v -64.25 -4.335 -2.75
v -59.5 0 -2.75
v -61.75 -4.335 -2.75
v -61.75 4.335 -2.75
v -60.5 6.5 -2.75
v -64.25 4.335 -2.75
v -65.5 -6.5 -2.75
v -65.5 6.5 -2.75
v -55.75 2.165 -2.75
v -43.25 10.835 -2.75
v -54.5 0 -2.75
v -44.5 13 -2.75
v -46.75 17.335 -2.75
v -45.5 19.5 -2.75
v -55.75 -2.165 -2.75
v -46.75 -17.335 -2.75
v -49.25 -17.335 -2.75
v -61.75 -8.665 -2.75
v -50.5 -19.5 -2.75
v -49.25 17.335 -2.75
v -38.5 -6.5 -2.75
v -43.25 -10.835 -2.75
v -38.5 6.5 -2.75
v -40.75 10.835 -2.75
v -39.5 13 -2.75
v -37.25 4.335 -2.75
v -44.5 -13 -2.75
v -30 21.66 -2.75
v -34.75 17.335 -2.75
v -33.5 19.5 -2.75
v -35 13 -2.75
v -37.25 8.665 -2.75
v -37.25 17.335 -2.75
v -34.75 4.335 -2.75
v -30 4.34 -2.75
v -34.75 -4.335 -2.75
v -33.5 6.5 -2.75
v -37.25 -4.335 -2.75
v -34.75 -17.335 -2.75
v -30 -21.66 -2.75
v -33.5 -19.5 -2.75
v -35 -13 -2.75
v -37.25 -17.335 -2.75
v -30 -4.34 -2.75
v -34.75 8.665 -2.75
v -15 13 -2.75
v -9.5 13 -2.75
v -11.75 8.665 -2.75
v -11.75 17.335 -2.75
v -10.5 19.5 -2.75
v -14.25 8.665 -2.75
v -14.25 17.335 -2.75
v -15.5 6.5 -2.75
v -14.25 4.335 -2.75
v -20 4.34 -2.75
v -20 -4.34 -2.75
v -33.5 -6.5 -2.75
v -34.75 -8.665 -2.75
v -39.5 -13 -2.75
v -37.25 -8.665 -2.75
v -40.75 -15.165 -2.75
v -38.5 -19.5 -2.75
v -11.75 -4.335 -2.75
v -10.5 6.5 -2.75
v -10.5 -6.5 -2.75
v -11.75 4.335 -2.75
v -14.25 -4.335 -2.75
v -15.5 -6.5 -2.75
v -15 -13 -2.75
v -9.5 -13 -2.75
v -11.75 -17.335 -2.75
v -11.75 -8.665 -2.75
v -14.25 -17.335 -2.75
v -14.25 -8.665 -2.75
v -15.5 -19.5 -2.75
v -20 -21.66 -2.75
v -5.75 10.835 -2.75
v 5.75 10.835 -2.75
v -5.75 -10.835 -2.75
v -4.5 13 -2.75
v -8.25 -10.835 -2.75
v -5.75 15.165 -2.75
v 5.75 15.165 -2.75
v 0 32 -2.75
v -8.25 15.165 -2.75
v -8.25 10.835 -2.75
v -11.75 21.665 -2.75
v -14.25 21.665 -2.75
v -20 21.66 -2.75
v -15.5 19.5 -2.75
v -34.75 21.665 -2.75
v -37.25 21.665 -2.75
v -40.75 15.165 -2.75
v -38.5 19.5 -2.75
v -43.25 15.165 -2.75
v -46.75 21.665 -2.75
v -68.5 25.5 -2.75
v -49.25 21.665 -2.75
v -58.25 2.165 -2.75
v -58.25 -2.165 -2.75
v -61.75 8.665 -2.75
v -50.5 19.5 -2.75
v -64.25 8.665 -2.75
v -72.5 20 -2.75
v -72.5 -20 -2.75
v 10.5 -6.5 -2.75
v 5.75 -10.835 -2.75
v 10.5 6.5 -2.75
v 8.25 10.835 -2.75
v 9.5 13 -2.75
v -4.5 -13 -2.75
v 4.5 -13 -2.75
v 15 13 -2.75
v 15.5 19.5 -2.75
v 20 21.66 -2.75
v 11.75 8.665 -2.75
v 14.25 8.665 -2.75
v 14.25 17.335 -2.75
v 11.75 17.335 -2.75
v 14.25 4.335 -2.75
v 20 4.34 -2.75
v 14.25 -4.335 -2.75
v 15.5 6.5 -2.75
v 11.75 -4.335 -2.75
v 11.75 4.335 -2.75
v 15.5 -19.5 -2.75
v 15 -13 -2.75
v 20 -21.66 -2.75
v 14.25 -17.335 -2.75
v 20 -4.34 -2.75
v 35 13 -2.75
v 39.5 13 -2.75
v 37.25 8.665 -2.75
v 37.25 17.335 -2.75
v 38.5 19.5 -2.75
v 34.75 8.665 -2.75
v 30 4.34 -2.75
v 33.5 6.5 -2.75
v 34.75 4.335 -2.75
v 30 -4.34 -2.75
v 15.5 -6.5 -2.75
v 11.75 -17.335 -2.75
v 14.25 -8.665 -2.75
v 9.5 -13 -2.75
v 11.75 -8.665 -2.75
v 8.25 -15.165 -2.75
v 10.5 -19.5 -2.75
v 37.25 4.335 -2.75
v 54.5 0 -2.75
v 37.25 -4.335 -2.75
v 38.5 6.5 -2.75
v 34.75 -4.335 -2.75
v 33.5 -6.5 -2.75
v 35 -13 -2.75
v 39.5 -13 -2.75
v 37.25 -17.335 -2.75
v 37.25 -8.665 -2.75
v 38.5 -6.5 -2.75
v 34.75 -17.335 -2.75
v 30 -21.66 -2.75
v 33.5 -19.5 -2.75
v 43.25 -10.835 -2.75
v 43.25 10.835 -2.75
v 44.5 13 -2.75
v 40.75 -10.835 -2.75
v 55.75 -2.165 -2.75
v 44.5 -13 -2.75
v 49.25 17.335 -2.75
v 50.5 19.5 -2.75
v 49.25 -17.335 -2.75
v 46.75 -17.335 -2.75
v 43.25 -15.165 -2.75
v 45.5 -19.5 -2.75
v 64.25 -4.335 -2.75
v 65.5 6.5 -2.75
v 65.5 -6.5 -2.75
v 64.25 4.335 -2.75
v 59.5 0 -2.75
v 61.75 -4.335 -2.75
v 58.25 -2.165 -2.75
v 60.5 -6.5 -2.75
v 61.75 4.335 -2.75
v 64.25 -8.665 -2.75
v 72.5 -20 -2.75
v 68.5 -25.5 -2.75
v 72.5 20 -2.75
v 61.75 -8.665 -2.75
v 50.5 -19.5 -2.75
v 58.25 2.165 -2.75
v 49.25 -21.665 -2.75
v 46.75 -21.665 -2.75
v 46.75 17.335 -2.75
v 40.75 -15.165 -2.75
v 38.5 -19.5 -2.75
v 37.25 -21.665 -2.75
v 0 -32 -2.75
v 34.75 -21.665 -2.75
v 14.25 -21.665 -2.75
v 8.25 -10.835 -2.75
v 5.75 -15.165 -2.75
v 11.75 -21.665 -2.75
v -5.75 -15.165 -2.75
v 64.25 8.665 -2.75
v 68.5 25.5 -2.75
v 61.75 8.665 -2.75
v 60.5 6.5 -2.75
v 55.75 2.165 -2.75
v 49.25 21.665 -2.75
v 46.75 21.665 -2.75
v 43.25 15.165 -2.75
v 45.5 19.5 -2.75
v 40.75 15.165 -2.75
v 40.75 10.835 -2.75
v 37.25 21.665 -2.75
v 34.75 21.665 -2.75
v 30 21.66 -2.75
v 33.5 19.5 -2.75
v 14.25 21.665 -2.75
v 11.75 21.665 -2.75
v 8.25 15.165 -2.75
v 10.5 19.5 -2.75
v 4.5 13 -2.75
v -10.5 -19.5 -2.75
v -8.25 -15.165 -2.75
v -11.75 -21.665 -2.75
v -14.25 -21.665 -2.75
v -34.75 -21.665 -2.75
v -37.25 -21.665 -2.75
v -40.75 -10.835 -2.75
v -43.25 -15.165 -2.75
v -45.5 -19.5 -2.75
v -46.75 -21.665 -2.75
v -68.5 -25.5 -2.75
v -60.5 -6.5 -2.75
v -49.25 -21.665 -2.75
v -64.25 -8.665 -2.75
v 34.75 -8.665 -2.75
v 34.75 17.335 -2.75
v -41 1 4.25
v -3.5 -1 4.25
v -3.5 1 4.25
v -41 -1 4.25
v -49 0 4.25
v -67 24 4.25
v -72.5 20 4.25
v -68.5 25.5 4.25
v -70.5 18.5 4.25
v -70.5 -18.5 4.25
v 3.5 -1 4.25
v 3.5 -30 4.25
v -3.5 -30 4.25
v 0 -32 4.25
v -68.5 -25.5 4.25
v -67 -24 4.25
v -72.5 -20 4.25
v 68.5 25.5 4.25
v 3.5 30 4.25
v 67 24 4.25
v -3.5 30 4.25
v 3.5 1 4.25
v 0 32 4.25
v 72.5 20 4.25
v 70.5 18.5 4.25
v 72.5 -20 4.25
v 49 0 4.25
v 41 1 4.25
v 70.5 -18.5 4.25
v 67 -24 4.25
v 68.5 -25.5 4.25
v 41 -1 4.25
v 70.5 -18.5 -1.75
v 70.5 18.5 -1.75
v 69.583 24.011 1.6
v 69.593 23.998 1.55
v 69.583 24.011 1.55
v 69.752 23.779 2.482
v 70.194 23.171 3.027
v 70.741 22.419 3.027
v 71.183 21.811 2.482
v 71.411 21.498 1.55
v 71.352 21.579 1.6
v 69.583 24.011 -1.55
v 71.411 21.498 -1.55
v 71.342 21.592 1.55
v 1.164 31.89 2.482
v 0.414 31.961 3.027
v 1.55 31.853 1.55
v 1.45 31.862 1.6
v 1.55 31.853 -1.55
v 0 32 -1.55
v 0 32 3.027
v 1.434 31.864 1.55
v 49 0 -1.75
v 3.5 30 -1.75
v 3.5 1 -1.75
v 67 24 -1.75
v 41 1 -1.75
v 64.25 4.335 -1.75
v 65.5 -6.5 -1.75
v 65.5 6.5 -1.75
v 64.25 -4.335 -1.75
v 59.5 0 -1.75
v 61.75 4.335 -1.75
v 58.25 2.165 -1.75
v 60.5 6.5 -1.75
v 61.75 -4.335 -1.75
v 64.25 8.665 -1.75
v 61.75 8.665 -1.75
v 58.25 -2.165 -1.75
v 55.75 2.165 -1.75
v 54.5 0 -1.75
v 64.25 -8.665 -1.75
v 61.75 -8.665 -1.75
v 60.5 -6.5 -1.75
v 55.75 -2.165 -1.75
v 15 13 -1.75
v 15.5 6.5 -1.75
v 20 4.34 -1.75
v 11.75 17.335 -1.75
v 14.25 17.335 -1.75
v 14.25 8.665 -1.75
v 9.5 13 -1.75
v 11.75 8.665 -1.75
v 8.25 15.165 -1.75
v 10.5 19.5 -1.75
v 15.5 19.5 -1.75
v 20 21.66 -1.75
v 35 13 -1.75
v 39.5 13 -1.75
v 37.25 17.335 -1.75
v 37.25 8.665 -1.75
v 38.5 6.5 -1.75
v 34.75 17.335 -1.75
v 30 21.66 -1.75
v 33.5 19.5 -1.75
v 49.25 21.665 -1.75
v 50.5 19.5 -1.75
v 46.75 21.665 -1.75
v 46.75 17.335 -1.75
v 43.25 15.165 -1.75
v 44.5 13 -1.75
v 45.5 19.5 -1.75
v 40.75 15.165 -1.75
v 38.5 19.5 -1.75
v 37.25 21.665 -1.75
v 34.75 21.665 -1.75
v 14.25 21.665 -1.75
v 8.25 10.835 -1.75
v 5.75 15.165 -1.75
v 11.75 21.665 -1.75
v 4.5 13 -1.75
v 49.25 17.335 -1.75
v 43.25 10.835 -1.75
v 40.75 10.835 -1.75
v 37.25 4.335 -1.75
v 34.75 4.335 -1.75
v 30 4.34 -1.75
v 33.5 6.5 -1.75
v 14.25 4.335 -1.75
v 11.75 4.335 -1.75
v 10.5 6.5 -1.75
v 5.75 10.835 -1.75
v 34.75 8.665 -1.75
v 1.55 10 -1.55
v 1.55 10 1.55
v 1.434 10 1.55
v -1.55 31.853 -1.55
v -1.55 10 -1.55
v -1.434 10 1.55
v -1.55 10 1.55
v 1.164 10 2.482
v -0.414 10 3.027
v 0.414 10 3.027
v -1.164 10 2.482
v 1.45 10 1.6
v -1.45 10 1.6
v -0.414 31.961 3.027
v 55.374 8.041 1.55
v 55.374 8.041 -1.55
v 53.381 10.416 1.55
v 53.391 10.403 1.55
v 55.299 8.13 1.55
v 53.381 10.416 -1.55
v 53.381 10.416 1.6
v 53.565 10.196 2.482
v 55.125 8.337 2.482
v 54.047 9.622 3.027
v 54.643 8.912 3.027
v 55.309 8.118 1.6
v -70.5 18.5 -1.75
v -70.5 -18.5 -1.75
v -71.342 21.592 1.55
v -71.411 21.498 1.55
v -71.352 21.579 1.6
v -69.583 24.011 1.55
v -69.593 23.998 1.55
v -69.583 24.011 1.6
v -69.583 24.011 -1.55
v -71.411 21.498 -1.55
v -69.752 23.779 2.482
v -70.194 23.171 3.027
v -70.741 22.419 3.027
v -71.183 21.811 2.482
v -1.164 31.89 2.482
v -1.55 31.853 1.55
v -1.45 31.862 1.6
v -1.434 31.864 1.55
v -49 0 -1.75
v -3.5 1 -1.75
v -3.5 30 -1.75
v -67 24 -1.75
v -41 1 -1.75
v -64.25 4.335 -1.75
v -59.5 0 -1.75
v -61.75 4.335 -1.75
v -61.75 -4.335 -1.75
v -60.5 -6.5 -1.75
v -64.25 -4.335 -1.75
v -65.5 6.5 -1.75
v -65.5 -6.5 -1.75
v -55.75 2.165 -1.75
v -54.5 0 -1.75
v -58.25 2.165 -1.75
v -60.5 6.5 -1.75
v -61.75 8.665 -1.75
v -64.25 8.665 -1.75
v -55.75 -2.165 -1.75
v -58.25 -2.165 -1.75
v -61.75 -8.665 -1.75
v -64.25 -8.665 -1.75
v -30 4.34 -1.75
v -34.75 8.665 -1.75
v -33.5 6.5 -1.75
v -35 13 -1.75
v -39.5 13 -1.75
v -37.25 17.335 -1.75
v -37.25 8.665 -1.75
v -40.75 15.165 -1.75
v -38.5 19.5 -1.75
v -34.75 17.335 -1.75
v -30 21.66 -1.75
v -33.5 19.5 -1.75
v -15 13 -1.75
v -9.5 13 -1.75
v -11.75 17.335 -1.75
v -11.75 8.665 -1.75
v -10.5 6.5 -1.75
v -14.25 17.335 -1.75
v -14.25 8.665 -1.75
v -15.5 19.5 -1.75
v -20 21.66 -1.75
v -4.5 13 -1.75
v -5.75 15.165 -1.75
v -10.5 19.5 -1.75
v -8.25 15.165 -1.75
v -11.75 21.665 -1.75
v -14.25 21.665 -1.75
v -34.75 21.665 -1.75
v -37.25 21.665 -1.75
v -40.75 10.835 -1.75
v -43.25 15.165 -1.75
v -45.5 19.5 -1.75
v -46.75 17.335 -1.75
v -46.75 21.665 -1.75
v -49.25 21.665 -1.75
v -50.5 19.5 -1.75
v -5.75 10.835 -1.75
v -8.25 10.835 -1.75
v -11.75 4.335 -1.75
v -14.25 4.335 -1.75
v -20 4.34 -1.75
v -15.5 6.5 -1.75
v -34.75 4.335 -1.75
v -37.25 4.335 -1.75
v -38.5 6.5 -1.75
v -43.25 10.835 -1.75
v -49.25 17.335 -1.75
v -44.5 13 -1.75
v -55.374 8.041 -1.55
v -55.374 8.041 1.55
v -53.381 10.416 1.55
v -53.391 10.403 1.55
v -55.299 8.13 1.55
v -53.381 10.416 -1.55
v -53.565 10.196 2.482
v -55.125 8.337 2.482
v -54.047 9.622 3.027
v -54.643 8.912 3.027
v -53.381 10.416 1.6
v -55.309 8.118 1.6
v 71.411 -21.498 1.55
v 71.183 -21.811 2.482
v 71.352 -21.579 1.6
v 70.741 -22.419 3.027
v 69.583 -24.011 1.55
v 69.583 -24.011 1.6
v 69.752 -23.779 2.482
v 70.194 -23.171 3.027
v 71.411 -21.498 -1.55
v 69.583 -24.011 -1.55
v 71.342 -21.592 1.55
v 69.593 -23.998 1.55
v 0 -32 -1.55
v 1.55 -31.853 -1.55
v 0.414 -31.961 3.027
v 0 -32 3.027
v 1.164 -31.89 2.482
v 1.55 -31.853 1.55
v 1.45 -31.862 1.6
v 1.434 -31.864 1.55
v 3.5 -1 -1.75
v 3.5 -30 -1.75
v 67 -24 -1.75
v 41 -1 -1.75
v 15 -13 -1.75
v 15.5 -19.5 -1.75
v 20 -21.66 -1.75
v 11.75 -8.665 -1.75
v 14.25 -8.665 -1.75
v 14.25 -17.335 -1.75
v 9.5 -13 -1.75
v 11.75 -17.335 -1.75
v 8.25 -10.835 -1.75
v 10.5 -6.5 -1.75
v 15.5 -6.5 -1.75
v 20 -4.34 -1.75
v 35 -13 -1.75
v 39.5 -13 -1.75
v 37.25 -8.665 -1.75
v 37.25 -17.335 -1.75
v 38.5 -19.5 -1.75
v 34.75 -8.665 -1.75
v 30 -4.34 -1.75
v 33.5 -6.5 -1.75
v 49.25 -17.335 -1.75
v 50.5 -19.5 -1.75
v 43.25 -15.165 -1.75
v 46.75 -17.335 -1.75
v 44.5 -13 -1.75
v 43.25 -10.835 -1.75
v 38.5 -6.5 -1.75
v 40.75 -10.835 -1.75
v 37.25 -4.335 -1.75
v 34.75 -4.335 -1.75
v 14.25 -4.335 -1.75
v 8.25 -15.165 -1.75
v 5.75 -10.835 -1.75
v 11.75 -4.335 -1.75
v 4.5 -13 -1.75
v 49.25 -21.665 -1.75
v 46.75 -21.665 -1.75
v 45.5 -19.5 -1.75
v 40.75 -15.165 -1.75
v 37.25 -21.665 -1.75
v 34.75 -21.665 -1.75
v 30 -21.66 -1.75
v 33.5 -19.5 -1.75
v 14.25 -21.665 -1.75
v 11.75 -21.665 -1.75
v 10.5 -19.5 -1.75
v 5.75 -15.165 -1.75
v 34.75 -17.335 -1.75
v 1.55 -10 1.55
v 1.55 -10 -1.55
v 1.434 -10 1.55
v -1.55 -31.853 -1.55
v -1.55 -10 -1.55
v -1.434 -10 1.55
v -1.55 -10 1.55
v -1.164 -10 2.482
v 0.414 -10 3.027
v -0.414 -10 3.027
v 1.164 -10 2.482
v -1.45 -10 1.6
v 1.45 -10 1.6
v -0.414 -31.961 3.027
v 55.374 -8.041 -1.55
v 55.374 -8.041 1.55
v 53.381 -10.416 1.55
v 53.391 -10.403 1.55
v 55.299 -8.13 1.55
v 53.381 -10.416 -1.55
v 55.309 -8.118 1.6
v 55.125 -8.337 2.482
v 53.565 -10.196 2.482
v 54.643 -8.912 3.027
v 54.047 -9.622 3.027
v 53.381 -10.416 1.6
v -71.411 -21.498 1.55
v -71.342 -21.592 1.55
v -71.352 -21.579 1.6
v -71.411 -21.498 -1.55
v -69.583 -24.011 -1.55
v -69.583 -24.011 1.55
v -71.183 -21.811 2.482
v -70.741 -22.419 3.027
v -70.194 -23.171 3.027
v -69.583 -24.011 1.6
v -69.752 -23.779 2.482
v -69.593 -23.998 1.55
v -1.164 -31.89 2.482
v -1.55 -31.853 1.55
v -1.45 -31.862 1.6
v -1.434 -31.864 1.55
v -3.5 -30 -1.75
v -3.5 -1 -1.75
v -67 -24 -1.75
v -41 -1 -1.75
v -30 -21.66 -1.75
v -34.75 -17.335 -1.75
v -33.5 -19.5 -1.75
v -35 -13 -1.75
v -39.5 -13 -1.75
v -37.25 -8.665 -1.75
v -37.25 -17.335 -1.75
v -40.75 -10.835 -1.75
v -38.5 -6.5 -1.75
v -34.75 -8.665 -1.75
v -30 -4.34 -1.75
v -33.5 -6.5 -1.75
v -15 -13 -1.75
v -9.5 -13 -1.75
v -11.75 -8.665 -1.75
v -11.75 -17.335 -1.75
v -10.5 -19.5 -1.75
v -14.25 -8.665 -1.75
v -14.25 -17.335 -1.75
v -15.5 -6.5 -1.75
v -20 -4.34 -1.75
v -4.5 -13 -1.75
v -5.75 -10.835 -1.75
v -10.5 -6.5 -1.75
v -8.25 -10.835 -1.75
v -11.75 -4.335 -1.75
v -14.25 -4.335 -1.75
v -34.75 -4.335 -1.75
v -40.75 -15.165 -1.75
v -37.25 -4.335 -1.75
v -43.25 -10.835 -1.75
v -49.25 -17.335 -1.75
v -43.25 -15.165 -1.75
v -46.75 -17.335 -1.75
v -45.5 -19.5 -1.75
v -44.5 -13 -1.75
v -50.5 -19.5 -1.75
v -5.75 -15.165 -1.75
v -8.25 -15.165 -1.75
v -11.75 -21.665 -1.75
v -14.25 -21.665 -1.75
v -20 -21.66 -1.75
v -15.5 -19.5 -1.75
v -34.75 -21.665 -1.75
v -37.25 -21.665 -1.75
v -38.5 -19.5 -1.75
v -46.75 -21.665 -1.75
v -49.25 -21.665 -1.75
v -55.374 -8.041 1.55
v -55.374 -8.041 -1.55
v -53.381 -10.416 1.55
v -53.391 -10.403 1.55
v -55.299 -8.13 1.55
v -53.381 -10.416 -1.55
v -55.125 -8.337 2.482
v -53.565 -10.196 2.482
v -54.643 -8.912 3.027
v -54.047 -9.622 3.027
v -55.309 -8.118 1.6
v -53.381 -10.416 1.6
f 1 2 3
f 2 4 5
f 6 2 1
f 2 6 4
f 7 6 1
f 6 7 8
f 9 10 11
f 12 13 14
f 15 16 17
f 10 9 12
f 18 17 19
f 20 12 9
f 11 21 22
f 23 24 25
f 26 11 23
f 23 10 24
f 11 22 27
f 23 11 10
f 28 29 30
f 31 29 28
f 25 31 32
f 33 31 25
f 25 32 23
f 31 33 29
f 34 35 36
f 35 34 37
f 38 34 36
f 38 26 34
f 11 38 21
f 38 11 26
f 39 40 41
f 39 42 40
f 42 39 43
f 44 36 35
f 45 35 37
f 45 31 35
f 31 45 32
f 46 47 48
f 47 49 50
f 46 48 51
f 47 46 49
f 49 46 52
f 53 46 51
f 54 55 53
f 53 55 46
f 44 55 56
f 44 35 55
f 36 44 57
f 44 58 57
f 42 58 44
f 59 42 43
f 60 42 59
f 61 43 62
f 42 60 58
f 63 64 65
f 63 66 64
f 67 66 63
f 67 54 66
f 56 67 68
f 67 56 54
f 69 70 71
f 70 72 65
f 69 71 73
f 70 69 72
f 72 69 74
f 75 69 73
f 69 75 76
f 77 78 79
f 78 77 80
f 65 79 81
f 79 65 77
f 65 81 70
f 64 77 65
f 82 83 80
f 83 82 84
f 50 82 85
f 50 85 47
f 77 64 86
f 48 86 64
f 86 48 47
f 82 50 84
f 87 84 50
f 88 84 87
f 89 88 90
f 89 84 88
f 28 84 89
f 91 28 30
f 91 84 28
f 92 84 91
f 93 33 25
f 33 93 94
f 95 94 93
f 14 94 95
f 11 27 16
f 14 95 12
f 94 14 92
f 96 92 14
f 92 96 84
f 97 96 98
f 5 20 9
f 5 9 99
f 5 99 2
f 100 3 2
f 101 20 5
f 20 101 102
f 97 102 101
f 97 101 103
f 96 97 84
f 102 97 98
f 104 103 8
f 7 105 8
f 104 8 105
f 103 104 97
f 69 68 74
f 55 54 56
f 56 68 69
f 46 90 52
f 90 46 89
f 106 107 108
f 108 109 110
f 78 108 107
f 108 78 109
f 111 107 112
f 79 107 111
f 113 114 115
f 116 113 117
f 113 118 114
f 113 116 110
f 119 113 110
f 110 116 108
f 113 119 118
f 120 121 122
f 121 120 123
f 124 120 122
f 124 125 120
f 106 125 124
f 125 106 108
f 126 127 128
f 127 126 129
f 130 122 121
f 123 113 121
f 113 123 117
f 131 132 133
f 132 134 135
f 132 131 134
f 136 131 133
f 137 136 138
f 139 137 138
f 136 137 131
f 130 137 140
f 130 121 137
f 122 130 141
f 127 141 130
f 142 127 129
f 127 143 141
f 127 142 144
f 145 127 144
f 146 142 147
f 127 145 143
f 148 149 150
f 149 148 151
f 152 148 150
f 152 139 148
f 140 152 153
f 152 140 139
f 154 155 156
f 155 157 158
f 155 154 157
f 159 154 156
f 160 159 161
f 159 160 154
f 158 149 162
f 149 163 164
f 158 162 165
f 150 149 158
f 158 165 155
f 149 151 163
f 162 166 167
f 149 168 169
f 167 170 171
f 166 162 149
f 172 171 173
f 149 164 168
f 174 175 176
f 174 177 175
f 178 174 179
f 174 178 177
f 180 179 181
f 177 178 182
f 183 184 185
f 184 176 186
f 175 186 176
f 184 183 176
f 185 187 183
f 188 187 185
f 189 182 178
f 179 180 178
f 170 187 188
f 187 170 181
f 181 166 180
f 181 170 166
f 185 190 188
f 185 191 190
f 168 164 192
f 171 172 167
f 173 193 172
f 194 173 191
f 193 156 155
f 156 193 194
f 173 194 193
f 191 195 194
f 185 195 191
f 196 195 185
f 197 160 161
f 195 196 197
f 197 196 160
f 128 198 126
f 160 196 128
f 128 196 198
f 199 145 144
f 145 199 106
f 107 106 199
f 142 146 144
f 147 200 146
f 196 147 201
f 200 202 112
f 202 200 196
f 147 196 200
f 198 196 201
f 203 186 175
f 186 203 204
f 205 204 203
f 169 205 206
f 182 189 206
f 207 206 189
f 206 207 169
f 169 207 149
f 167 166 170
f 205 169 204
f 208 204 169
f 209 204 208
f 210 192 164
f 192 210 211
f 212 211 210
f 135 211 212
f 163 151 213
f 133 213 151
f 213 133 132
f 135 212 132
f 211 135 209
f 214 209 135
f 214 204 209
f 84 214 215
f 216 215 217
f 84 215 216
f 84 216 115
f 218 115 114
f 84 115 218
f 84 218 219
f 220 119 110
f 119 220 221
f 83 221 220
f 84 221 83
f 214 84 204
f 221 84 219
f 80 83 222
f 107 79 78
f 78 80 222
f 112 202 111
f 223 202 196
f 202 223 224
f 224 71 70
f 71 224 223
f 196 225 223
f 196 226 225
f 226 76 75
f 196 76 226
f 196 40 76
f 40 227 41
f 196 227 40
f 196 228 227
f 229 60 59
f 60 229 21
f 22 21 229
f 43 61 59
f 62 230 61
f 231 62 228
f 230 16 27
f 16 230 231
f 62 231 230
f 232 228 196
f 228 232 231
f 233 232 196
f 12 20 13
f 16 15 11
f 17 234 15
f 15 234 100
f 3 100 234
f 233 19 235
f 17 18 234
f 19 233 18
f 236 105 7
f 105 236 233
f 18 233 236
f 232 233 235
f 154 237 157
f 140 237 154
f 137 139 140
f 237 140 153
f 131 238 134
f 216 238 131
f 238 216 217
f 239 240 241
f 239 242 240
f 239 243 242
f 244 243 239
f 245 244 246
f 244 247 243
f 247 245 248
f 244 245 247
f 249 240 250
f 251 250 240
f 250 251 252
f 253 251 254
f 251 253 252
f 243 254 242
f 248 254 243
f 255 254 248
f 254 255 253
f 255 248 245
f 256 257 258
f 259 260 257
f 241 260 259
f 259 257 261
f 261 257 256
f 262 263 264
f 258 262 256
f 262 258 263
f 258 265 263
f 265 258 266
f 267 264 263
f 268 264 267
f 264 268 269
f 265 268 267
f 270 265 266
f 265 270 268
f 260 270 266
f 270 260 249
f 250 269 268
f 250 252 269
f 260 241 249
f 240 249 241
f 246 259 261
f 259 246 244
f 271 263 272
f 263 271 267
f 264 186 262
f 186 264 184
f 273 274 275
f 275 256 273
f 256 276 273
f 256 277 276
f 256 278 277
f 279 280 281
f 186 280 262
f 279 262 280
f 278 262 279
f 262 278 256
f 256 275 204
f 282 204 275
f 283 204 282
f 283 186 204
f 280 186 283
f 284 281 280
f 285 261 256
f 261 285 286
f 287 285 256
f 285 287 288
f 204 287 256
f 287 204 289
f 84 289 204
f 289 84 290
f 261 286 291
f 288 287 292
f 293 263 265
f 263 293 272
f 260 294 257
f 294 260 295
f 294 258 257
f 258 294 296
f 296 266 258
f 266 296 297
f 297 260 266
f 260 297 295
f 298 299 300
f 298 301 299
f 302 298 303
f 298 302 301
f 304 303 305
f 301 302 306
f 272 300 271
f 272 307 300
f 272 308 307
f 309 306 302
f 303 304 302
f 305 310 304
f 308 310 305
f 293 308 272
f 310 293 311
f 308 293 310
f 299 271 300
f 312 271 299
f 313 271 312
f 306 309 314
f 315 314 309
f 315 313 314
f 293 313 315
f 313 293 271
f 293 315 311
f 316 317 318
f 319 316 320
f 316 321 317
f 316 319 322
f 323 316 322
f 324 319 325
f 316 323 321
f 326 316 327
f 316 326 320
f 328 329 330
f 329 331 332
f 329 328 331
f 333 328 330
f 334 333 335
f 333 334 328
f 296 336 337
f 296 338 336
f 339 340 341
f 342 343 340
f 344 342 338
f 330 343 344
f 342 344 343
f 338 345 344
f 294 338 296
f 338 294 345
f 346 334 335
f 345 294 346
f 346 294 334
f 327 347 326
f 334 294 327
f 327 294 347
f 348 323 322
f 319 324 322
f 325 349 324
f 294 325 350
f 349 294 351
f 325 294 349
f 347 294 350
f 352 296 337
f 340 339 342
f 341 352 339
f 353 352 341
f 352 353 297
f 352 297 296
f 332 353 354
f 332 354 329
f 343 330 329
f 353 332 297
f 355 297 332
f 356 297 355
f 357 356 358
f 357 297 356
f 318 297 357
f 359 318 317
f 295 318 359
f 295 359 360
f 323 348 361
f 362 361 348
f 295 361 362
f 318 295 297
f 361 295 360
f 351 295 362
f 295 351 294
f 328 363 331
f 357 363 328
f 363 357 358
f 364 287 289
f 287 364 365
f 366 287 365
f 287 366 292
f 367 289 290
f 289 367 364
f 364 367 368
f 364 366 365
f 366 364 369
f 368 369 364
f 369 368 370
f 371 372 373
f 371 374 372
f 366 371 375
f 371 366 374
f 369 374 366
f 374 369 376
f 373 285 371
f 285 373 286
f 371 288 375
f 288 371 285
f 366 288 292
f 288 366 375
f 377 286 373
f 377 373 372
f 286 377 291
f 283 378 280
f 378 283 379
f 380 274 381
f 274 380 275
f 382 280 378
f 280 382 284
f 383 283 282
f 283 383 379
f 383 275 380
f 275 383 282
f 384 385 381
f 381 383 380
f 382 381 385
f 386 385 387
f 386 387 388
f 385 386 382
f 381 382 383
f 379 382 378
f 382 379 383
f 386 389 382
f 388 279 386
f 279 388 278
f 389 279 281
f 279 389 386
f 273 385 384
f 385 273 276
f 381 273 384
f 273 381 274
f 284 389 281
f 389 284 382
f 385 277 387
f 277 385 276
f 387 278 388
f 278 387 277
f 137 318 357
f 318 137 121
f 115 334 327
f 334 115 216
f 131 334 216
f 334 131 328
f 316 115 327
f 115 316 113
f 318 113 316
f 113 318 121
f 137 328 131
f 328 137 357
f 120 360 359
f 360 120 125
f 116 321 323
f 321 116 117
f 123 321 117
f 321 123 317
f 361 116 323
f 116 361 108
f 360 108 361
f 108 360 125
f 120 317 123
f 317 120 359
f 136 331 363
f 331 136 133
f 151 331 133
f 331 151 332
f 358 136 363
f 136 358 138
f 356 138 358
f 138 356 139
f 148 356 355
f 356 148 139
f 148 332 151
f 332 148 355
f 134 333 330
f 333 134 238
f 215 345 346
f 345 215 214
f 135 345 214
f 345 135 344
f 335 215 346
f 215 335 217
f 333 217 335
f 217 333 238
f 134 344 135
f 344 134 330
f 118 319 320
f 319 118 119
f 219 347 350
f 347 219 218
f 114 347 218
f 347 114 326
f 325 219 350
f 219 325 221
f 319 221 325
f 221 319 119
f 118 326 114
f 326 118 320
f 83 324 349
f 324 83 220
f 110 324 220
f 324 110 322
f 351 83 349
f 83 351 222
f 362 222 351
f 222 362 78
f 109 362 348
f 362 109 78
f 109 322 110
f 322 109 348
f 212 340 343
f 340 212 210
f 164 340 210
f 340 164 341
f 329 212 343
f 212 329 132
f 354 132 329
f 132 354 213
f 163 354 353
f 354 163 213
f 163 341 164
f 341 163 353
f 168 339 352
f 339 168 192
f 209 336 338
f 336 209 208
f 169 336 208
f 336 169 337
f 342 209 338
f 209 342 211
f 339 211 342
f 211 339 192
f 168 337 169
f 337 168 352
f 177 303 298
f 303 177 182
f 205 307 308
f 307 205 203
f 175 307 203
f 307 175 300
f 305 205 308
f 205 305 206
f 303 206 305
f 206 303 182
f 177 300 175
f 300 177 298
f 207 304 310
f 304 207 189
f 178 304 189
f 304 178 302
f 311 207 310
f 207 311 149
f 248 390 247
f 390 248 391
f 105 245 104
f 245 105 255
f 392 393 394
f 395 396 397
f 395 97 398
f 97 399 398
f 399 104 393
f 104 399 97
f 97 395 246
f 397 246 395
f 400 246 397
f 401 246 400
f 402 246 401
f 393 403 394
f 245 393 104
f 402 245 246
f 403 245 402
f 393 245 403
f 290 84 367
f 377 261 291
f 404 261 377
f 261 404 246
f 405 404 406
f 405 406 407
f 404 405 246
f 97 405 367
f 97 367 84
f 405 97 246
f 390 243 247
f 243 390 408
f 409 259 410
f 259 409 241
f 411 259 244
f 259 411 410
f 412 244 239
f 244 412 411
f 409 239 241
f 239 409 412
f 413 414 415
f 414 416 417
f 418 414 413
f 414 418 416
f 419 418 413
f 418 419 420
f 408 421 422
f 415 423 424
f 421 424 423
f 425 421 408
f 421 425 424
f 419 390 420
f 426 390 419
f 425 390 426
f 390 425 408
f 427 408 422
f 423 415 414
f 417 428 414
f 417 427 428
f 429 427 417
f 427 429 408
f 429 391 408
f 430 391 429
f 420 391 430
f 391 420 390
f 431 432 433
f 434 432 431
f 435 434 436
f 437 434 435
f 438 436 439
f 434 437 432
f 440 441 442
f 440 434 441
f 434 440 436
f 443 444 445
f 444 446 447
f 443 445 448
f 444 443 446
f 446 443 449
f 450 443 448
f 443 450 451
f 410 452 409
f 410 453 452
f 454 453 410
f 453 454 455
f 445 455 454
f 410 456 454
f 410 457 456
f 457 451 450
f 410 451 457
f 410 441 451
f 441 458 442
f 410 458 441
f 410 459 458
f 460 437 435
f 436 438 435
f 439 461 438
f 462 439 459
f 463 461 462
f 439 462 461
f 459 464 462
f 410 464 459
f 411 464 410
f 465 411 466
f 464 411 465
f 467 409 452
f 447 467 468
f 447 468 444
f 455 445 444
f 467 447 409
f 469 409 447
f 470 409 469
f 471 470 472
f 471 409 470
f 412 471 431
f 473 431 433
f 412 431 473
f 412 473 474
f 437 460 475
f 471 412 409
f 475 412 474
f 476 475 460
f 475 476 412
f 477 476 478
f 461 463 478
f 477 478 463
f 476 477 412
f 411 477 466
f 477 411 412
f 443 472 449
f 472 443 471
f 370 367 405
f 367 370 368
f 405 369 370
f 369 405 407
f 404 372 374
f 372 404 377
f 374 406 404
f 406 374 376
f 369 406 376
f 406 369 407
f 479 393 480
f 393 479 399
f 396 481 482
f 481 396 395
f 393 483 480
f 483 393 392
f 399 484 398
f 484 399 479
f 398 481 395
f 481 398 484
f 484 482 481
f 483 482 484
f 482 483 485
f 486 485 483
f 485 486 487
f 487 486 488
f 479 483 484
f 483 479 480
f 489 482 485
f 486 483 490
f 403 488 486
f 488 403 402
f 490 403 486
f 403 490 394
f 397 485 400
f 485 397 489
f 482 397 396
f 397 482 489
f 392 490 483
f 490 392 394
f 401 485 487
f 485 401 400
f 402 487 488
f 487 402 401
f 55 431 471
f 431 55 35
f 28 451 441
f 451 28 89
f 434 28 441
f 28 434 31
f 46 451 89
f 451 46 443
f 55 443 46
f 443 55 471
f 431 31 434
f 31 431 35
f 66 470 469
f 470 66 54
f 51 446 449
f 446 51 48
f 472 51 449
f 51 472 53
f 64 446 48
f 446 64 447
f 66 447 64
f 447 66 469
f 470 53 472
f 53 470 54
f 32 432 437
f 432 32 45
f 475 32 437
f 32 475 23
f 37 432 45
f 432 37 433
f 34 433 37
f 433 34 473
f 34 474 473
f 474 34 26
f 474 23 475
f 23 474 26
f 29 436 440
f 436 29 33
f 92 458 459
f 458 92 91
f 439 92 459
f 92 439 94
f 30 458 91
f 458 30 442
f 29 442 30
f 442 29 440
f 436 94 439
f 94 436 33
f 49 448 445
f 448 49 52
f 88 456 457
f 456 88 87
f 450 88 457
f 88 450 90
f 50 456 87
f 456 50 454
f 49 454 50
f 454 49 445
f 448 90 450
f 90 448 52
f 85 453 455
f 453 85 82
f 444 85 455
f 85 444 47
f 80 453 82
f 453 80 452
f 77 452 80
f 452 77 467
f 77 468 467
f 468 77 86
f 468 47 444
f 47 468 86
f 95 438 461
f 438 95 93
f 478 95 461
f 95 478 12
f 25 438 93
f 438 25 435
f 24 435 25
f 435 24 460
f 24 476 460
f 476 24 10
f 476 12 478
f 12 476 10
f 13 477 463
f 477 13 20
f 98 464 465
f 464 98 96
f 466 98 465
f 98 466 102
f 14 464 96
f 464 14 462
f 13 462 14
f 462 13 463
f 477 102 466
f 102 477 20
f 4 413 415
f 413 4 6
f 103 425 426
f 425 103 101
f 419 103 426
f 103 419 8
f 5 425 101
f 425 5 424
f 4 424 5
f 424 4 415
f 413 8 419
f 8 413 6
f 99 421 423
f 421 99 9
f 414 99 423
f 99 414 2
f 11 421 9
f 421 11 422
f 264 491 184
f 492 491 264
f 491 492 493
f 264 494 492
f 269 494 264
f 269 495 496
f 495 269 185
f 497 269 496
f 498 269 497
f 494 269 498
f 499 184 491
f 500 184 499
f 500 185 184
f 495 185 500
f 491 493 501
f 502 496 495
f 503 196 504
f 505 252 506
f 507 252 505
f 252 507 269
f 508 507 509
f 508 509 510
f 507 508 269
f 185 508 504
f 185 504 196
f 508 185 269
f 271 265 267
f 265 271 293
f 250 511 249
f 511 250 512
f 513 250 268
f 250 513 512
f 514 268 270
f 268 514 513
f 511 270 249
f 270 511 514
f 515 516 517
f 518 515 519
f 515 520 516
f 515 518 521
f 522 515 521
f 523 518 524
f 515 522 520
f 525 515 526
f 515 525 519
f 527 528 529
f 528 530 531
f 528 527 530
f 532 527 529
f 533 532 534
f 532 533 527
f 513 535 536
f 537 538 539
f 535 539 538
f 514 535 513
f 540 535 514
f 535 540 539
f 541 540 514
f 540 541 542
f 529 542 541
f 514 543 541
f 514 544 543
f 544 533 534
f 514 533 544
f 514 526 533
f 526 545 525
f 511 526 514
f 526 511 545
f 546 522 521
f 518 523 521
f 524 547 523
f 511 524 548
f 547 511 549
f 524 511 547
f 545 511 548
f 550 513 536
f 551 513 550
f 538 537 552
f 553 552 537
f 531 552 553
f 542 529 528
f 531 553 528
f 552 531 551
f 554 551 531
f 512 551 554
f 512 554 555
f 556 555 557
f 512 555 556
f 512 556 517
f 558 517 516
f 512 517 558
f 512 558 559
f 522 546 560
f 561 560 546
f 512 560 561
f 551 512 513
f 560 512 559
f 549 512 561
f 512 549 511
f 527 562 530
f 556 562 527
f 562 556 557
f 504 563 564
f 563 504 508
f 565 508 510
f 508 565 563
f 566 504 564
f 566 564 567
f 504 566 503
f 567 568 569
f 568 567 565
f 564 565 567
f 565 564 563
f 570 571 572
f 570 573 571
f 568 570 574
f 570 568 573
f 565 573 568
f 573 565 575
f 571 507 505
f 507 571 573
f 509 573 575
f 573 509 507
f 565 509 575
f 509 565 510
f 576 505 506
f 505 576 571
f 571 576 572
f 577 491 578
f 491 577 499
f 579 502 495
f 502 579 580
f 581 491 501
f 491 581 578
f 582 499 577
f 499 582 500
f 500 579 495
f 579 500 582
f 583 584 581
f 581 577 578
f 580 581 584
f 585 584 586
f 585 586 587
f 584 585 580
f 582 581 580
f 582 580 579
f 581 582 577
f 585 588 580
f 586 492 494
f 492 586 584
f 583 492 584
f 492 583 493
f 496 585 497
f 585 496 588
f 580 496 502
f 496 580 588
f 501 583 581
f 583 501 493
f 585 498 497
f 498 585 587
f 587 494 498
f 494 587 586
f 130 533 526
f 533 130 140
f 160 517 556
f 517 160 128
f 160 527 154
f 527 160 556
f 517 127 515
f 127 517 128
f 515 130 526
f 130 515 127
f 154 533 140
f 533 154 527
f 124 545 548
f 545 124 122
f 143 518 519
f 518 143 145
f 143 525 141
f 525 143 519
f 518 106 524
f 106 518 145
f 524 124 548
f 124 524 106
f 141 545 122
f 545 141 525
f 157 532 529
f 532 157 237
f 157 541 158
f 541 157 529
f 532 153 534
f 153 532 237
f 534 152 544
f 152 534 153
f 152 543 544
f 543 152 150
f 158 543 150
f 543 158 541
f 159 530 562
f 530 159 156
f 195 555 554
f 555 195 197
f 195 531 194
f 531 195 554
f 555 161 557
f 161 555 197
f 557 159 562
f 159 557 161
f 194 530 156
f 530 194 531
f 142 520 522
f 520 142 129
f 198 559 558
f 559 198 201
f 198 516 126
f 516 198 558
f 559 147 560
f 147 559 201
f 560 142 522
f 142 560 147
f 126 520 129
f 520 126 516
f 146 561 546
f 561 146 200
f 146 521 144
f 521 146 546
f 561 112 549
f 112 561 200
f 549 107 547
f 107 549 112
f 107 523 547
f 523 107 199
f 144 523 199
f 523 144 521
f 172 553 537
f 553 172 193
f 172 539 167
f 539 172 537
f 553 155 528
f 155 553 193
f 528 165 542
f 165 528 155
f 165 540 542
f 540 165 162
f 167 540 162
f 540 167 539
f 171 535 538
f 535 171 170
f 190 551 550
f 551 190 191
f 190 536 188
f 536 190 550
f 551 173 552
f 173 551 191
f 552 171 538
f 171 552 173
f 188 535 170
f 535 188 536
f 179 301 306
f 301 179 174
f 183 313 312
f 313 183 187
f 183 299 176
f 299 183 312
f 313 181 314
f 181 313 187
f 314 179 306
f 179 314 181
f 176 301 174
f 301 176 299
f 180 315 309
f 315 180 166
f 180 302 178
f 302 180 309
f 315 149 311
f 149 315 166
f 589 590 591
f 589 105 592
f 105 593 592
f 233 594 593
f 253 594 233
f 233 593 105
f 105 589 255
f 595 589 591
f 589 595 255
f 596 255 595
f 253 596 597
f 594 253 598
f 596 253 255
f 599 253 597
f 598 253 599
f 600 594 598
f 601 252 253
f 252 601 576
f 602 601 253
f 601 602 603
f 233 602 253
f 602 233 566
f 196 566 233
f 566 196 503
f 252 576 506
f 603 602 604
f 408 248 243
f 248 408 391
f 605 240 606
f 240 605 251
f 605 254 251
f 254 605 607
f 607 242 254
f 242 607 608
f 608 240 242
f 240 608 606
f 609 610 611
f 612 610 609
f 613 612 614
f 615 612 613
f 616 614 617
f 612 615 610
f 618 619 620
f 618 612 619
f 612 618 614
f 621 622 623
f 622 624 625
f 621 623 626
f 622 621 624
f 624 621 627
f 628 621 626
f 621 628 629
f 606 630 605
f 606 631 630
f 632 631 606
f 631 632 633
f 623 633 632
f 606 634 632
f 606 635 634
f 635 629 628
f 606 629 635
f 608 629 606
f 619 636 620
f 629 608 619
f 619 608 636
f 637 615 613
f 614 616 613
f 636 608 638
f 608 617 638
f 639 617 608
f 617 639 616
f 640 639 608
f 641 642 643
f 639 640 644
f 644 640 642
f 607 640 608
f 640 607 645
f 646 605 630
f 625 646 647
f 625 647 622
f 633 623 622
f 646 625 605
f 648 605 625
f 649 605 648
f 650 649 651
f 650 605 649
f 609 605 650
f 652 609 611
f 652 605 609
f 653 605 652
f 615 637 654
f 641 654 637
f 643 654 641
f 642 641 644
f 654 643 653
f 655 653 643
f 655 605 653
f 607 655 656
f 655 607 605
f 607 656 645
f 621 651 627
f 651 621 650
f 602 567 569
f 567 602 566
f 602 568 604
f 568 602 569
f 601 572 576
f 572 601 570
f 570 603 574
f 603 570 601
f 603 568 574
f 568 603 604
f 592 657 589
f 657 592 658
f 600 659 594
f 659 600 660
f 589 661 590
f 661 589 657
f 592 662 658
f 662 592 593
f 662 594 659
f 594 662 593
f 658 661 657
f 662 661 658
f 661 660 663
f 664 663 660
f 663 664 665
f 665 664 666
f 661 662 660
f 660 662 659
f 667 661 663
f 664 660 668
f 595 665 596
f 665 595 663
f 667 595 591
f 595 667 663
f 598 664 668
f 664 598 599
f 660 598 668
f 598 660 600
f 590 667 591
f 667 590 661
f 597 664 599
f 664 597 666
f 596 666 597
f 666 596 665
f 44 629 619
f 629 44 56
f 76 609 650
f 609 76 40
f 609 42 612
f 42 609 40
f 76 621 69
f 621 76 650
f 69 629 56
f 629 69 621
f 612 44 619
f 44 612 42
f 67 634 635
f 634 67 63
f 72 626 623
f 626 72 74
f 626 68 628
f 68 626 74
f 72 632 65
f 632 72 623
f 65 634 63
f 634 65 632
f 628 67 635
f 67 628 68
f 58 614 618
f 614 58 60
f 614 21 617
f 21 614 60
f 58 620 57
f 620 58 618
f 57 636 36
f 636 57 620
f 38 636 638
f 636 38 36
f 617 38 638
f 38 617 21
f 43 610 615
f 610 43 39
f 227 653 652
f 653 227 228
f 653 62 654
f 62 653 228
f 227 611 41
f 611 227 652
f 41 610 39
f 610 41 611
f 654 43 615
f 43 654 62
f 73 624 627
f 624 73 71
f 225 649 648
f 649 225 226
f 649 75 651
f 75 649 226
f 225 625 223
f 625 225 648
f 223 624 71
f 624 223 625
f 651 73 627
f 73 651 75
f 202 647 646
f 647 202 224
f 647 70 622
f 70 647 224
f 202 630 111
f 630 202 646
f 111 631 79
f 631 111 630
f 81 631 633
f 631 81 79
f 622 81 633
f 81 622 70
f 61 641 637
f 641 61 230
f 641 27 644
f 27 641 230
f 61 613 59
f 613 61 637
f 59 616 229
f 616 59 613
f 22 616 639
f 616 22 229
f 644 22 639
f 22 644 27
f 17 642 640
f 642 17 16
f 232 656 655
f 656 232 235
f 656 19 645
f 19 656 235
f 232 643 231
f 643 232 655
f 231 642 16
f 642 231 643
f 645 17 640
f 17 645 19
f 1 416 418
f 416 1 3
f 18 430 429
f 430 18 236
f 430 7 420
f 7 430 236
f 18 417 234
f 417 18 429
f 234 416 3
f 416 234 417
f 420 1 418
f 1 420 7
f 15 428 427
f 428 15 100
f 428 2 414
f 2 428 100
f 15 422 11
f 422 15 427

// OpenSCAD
// Syma X1 arm & prop disc
// Left-middle:
/*translate([0, -10, 0]) {
    rotate([0, 0, 180]) {
        union() {
            translate([-1.5, 0, -1.5]) {
                cube([3, 109, 3]);
            }
            translate([-10, 97, -10]) {
                cube([24, 24, 37]);
            }
            translate([0, 109, 27]) {
                cylinder(h=8.75, d=135);
            }
        }
    }
}

// Syma X1 arm & prop disc
// Left-rear:
translate([55, -10, 0]) {
    rotate([0, 0, 230]) {
        union() {
            translate([-1.5, 0, -1.5]) {
                cube([3, 109, 3]);
            }
            translate([-10, 97, -10]) {
                cube([24, 24, 37]);
            }
            translate([0, 109, 27]) {
                cylinder(h=8.75, d=135);
            }
        }
    }
}*/

module quarter() {
    difference() {
        translate([0, 0, -2.75]) {
            union() {
                linear_extrude(height=7) {
                    polygon(
                        points=[
                            // Outer race
                            [0, 0],
                            [0, 32],
                            [68.5, 25.5],

                            [72.5, 20],
                            [72.5, 0],
                            [70.5, 0],
                            [70.5, 18.5],
                            [49, 0],
                    
                            //Inner race
                            [3.5, 1],
                            [3.5, 30],
                            [67, 24],
                            [41, 1],
                        ],
                        paths=[
                            [0, 1, 2, 3, 4, 5, 6, 7],
                            [8, 9, 10, 11],
                            //[9, 10, 11],
                        ]
                    );
                }

    
                linear_extrude(height=1) {
                    polygon(
                        points=[
                            // Outer race
                            [0, 0],
                            [0, 32],
                            [68, 25.5],

                            //[70, 0],
                            [72.5, 20],
                            [72.5, 0],
                            [67.5, 0],
                        ],
                        paths=[
                            [0, 1, 2, 3, 4, 5, 6, 7],
                        ]
                    );
                }
            }
        }

        translate([25, 13, -4]) {
            cylinder(h=3, d=20, $fn=6);
        }

        translate([13, 6.5, -4]) {
            cylinder(h=3, d=5, $fn=6);
        }

        translate([36, 6.5, -4]) {
            cylinder(h=3, d=5, $fn=6);
        }

        translate([36, 19.5, -4]) {
            cylinder(h=3, d=5, $fn=6);
        }

        translate([13, 19.5, -4]) {
            cylinder(h=3, d=5, $fn=6);
        }

        translate([7, 13, -4]) {
            cylinder(h=3, d=5, $fn=6);
        }

        translate([42, 13, -4]) {
            cylinder(h=3, d=5, $fn=6);
        }

        translate([48, 19.5, -4]) {
            cylinder(h=3, d=5, $fn=6);
        }

        translate([63, 6.5, -4]) {
            cylinder(h=3, d=5, $fn=6);
        }

        translate([57, 0, -4]) {
            cylinder(h=3, d=5, $fn=6);
        }
        
        mirror([0, 1, 0]) {
            translate([-1.55, -32, -1.55]) {
                cube([3.1, 22, 3.1]);
                translate([1.5, 22, 3.15]) {
                    rotate([90, 0, 0]) {
                        cylinder(h=22, d=3, $fn=10);
                    }
                }
            }

            translate([71, -25.2, -1.55]) {
                rotate([0, 0, 50]) {
                    cube([3.1, 23, 3.1]);
                    translate([1.5, 23, 3.15]) {
                        rotate([90, 0, 0]) {
                            cylinder(h=23, d=3, $fn=10);
                        }
                    }
                }
            }
        }
    }
}

module whole() {
    union() {
        quarter();
        mirror() {
            quarter();
        }
        mirror([0, 1, 0]) {
            quarter();
            mirror() {
                quarter();
            }
        }
    }
}

whole();
